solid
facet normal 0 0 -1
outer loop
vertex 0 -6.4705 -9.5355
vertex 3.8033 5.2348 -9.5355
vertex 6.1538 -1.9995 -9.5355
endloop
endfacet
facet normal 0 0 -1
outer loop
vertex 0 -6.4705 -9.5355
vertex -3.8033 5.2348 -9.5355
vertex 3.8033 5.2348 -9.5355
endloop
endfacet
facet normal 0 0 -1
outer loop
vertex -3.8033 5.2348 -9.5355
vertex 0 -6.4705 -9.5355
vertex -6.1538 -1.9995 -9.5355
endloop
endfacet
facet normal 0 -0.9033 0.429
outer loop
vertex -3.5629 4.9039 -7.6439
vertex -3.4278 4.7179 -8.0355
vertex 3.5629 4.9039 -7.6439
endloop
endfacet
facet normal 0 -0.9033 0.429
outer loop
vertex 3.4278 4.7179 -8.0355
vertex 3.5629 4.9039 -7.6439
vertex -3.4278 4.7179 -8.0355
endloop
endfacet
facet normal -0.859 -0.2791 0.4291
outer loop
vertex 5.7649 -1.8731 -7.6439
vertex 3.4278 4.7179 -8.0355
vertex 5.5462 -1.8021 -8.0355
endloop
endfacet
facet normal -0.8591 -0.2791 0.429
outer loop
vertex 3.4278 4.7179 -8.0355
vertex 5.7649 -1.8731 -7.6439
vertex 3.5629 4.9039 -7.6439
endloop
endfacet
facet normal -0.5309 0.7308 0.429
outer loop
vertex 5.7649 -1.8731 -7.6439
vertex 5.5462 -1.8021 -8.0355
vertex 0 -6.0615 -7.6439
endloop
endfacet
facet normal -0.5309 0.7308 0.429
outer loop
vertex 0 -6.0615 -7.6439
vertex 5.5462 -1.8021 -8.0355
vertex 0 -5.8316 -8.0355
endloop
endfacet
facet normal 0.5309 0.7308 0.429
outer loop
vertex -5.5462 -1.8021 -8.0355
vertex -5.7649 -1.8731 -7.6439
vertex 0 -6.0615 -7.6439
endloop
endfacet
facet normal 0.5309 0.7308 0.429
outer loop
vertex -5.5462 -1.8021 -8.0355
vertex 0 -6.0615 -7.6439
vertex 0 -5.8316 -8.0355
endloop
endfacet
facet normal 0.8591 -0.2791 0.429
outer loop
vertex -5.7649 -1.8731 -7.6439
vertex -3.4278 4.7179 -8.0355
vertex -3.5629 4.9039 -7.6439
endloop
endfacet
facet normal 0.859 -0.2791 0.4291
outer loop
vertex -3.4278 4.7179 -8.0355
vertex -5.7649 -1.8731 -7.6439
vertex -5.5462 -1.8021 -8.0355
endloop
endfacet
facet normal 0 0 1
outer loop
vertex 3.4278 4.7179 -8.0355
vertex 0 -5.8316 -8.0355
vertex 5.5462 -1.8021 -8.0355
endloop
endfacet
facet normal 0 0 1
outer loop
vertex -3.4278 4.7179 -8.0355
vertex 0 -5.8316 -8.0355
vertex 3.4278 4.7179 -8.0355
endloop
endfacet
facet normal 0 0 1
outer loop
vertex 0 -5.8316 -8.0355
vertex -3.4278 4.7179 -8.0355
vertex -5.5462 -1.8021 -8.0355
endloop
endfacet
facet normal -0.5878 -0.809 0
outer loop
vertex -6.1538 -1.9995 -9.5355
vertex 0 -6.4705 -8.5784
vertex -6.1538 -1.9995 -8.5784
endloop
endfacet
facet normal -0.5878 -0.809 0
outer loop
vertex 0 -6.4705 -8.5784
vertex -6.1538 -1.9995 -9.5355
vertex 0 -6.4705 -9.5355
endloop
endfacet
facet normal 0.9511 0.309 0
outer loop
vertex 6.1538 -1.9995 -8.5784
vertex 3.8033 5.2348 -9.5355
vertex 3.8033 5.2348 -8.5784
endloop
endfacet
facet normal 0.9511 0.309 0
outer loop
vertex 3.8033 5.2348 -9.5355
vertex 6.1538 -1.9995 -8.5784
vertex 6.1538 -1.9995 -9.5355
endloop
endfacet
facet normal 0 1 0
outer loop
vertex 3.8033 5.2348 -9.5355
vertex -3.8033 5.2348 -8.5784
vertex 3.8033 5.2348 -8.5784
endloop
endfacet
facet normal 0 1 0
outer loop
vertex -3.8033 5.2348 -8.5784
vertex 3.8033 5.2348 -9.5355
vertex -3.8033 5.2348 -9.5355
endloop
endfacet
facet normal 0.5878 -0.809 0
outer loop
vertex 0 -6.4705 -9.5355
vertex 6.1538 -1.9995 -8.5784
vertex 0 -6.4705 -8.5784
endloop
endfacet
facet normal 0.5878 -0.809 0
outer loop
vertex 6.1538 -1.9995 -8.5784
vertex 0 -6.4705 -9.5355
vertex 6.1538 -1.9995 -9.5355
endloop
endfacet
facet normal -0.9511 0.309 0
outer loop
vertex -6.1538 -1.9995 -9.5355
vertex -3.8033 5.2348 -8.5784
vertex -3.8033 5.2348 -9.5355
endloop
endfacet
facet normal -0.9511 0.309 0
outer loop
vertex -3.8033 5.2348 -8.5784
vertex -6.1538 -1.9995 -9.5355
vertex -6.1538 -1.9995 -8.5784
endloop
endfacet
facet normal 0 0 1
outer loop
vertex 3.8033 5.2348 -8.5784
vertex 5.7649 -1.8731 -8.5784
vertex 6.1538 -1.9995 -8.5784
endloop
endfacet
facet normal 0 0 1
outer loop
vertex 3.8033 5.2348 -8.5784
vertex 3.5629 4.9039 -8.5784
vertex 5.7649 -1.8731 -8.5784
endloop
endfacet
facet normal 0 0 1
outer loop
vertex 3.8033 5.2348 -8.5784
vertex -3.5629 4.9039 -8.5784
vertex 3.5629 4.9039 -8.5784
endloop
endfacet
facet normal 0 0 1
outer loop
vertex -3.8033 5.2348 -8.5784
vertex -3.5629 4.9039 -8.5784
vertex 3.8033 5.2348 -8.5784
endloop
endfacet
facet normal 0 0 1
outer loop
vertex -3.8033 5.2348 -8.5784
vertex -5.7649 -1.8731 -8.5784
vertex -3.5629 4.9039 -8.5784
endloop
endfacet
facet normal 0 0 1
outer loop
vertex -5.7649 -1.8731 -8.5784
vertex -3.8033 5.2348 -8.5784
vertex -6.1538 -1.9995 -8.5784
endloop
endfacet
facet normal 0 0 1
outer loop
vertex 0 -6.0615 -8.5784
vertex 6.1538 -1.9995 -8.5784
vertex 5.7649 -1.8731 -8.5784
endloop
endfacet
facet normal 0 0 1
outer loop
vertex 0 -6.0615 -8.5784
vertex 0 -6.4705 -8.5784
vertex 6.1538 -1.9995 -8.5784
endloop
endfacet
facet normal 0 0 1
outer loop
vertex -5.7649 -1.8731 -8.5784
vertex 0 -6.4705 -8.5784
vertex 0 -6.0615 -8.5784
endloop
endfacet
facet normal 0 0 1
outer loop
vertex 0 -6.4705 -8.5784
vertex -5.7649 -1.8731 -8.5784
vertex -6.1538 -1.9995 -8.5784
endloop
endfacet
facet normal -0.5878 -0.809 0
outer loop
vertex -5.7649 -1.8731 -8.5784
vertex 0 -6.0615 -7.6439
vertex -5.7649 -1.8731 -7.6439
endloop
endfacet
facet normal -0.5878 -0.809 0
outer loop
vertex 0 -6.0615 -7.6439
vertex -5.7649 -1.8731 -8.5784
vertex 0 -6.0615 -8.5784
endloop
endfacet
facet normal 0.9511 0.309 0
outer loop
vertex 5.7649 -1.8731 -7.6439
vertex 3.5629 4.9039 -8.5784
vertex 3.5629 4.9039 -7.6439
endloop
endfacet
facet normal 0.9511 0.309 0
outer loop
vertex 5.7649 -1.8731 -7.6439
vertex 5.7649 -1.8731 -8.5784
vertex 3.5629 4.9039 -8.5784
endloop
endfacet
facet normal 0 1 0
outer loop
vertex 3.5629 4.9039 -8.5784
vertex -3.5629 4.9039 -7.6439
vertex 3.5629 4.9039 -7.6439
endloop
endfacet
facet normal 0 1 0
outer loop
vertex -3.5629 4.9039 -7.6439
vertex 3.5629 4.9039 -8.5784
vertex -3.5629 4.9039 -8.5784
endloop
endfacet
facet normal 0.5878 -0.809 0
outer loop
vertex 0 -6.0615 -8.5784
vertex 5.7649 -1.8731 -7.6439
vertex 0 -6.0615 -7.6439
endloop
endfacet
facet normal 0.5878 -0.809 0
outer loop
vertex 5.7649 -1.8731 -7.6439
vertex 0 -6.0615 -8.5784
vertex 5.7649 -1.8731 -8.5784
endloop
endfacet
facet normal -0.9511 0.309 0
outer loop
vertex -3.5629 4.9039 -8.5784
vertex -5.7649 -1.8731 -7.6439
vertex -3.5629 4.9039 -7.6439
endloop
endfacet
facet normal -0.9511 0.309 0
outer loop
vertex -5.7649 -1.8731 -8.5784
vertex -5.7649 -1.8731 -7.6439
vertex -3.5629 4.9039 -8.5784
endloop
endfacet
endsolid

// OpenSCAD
hauteurExt = 19.071; // équivalent sphère circonscrite 24 mm
epaisseurParoi = 1.5;
diametreTrouBouchon = 1.6;
r = 0.19; // résolution d'impression sur l'axe Z
echelleReductionAjustementBouchon = 0.95;

//corps_ouvert();
//bouchon_avec_attache();
bouchon();
//bouchon_trou();

module corps_ouvert() {
	difference() {
		dode_creux();
		decoupe_bouchon();
	}
}

module bouchon_avec_attache() {
	scale([echelleReductionAjustementBouchon, echelleReductionAjustementBouchon, 1])
	union () {
		intersection() {
			dode_creux();
			decoupe_bouchon();
		}
		translate([0, 0, hauteurExt/2])
		rotate([90, 0, 54])
		rotate_extrude(convexity = 10, $fn=40)
		translate([1, 0, 0])
		circle(r = 0.5, $fn=40);
	}
}

module bouchon_trou() {
	scale([echelleReductionAjustementBouchon, echelleReductionAjustementBouchon, 1])
	difference () {
		intersection() {
			dode_creux();
			decoupe_bouchon();
		}
		translate([0, 0, hauteurExt/2.5])
		cylinder(30, r=diametreTrouBouchon/2, $fn=22);
	}
}

module bouchon() {
    rotate([0,180,0])
	scale([echelleReductionAjustementBouchon, echelleReductionAjustementBouchon, 1])
	difference () {
		intersection() {
			dode_creux();
			decoupe_bouchon();
		}
	}
}

module dode_creux() {
	difference() {
		dodecahedron(hauteurExt);
		dodecahedron(hauteurExt - 2 * epaisseurParoi);
	}
}

module decoupe_bouchon() {
	rotate([0,0,54]) translate([0,0,hauteurExt/2.5+5*r])
		cylinder(6*r, r=hauteurExt/2.8, $fn=5);
	rotate([0,0,54]) translate([0,0,hauteurExt/2.5])
		cylinder(6*r, r=hauteurExt/2.42-epaisseurParoi, $fn=5);
}

module dodecahedron(height) {
	scale([height,height,height]) {
		intersection() {
			cube([2,2,1], center = true); 
			intersection_for(i=[0:4]) { 
				rotate([0,0,72*i])
				rotate([116.565,0,0])
					cube([2,2,1], center = true); 
			}
		}
	}
}
